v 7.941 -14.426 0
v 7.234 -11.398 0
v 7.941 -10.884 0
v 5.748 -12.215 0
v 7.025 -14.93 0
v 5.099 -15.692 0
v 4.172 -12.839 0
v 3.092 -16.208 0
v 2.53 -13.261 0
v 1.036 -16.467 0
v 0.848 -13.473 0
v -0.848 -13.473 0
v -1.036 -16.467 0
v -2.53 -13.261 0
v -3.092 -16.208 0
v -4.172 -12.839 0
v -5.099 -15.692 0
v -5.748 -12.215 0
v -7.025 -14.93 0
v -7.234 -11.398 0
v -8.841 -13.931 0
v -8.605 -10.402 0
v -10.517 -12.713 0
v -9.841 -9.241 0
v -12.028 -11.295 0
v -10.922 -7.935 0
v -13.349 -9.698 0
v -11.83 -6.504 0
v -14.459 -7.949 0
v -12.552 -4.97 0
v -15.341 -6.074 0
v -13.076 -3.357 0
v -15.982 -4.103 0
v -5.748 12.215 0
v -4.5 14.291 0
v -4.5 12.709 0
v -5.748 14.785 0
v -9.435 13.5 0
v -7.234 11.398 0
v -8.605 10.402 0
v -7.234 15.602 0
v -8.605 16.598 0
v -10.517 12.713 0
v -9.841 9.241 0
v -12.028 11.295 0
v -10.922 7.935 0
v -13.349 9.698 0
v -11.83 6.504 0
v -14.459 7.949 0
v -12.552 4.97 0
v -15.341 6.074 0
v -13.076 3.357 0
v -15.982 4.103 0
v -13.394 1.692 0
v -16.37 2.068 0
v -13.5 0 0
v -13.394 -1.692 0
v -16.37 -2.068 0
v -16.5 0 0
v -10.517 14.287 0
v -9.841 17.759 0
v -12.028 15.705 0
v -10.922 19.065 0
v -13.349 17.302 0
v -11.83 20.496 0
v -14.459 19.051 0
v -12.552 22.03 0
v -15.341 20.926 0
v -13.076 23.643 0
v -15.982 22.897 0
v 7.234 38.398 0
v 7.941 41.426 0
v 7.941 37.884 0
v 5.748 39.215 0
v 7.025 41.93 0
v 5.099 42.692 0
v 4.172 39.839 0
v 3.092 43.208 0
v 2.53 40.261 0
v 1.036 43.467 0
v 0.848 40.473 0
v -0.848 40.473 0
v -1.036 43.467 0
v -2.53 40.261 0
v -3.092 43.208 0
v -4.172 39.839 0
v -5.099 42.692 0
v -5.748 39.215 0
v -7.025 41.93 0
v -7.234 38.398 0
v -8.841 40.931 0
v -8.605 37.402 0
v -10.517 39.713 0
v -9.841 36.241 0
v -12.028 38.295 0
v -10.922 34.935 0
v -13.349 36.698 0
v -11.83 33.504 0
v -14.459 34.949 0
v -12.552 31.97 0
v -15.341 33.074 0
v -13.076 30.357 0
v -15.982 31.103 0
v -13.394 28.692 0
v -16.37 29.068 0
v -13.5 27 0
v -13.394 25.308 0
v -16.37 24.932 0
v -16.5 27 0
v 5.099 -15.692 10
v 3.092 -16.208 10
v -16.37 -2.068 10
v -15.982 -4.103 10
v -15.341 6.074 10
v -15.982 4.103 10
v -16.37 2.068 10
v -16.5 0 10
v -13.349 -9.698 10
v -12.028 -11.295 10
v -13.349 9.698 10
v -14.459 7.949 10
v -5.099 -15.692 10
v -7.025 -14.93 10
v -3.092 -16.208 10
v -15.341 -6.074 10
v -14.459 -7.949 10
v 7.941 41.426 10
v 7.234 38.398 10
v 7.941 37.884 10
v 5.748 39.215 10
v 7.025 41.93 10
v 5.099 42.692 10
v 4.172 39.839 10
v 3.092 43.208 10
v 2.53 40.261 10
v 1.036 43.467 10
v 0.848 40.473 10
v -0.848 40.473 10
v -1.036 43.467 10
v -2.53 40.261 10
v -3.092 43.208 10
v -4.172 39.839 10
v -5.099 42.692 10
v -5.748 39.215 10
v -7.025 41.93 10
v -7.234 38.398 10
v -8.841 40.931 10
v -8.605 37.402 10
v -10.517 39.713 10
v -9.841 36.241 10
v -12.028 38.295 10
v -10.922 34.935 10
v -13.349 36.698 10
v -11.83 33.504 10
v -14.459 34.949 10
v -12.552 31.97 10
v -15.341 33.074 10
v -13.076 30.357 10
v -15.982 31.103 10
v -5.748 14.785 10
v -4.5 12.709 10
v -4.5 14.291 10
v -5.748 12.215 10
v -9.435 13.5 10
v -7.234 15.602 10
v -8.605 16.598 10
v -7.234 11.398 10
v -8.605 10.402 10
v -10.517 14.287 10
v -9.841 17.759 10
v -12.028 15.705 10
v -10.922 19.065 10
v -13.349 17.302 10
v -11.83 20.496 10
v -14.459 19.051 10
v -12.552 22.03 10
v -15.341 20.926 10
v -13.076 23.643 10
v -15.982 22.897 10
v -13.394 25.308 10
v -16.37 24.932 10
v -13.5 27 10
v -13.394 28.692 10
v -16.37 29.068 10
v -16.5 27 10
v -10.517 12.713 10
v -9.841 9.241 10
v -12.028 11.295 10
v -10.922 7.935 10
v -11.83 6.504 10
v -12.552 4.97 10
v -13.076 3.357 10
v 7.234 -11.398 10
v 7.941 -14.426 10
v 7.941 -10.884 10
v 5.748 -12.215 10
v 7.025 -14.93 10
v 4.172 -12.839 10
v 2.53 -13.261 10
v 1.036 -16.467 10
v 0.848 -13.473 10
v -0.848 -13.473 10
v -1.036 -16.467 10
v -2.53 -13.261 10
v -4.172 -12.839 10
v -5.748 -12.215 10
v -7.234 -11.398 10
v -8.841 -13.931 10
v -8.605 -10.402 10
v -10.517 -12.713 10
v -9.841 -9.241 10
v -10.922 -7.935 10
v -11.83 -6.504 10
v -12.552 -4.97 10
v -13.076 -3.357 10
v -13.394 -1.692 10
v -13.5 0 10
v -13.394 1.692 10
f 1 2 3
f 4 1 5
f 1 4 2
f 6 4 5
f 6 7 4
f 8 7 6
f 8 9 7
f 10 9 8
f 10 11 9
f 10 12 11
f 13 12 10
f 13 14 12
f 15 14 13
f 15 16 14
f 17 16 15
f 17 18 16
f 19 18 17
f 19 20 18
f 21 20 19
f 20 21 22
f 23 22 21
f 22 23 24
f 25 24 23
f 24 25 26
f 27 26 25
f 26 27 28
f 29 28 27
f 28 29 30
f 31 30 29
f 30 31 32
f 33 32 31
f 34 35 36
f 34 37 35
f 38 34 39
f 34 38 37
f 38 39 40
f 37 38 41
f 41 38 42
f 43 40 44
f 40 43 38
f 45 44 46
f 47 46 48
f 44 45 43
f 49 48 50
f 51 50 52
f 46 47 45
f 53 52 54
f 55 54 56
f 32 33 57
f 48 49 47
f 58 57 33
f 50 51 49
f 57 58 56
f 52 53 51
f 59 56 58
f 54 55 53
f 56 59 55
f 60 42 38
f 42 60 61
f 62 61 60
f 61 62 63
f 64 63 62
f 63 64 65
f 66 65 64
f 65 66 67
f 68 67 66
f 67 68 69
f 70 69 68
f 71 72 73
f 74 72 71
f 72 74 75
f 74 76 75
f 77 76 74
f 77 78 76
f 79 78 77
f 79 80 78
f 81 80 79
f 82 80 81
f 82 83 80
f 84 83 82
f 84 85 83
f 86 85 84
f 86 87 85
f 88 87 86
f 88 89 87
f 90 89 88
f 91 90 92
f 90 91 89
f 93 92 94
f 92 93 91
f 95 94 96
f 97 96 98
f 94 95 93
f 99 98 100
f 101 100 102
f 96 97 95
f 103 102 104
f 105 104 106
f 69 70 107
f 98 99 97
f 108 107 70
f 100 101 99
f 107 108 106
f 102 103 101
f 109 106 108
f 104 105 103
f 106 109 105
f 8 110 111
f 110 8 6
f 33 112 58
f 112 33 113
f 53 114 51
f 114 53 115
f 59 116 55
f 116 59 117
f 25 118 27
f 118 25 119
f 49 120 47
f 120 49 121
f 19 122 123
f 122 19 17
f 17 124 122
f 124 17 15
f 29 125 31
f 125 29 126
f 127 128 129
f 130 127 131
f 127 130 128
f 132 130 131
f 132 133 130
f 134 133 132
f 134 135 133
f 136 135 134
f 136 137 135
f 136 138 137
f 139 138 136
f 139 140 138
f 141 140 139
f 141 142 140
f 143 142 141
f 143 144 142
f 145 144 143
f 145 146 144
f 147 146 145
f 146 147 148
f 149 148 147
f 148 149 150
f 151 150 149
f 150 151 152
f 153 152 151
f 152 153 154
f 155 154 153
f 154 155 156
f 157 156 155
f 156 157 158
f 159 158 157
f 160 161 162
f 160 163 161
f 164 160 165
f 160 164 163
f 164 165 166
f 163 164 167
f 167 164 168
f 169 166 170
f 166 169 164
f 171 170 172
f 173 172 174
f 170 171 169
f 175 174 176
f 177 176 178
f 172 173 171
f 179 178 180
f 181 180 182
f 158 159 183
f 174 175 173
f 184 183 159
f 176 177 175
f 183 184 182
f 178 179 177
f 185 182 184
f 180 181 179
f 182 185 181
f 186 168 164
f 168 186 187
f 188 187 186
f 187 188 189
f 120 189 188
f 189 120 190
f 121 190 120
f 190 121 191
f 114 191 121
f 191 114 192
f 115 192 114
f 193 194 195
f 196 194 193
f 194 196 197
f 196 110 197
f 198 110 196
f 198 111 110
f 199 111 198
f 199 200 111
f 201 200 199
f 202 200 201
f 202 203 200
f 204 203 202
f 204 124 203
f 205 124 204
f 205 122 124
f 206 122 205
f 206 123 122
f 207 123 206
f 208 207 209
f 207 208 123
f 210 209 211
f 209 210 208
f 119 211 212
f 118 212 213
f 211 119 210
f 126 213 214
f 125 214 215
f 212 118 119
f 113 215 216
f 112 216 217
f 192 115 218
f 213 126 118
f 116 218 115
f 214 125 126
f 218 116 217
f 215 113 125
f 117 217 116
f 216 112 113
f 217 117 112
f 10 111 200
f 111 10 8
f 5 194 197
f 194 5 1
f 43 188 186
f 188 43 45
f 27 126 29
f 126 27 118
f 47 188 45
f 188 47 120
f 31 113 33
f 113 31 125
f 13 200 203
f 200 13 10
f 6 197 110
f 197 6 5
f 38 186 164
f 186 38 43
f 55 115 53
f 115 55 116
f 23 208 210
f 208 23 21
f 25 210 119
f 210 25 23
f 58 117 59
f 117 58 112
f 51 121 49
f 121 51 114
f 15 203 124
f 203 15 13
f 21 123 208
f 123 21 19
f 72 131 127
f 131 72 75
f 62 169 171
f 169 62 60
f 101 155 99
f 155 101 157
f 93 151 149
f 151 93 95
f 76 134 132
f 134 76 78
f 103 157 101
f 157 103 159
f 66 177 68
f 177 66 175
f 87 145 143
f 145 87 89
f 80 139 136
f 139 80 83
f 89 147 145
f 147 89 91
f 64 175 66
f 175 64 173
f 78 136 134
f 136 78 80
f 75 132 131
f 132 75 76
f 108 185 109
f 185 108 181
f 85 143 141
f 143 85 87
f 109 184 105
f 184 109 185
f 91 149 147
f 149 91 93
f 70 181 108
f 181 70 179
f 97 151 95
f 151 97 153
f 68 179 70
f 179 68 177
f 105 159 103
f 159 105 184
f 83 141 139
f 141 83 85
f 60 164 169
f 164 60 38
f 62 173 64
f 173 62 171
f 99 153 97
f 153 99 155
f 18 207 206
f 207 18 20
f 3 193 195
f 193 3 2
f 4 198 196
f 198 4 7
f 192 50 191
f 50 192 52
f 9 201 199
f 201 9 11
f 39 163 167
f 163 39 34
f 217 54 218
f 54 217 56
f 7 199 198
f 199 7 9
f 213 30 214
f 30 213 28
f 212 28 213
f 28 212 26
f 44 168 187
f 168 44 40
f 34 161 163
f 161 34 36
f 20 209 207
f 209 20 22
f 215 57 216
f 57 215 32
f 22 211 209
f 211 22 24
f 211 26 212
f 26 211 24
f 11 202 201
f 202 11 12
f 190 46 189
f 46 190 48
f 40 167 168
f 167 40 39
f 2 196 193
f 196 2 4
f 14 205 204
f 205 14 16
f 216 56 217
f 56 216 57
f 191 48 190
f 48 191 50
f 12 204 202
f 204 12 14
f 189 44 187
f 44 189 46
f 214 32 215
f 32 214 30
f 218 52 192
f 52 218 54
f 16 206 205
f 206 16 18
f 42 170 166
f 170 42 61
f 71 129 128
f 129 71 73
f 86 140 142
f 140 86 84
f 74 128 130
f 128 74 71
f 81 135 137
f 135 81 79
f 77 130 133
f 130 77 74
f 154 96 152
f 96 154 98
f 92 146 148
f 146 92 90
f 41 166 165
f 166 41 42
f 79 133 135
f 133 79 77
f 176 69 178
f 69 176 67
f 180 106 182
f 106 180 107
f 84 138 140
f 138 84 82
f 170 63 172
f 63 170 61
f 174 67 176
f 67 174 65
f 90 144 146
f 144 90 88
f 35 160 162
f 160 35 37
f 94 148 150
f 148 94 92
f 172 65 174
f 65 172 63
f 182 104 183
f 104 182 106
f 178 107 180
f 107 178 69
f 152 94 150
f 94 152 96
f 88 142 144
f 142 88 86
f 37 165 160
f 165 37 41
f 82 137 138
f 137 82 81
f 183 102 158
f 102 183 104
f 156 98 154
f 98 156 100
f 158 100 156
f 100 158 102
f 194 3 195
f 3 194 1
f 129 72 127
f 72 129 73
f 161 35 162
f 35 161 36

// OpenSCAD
// -----------------------------------------------------
// Gartenliegen-Klemme
//
//  Detlev Ahlgrimm, 22.06.2019
// -----------------------------------------------------

// diameter
d=27;

// height
h=10;

// wallthickness
ws=3;

/* [Hidden] */
$fn=50;


difference() {
  union() {
    cylinder(d=d+2*ws, h=h);
    translate([0, d, 0]) cylinder(d=d+2*ws, h=h);
  }
  translate([0, 0, -0.1]) cylinder(d=d, h=h+0.2);
  translate([0, d, -0.1]) cylinder(d=d, h=h+0.2);
  translate([d/3.4, -d/2-ws, -0.1]) cube([d, 2*d+2*ws, h+0.2]);
  translate([-d/6, d/2-2*ws, -0.1]) cube([d, 4*ws, h+0.2]);
}
